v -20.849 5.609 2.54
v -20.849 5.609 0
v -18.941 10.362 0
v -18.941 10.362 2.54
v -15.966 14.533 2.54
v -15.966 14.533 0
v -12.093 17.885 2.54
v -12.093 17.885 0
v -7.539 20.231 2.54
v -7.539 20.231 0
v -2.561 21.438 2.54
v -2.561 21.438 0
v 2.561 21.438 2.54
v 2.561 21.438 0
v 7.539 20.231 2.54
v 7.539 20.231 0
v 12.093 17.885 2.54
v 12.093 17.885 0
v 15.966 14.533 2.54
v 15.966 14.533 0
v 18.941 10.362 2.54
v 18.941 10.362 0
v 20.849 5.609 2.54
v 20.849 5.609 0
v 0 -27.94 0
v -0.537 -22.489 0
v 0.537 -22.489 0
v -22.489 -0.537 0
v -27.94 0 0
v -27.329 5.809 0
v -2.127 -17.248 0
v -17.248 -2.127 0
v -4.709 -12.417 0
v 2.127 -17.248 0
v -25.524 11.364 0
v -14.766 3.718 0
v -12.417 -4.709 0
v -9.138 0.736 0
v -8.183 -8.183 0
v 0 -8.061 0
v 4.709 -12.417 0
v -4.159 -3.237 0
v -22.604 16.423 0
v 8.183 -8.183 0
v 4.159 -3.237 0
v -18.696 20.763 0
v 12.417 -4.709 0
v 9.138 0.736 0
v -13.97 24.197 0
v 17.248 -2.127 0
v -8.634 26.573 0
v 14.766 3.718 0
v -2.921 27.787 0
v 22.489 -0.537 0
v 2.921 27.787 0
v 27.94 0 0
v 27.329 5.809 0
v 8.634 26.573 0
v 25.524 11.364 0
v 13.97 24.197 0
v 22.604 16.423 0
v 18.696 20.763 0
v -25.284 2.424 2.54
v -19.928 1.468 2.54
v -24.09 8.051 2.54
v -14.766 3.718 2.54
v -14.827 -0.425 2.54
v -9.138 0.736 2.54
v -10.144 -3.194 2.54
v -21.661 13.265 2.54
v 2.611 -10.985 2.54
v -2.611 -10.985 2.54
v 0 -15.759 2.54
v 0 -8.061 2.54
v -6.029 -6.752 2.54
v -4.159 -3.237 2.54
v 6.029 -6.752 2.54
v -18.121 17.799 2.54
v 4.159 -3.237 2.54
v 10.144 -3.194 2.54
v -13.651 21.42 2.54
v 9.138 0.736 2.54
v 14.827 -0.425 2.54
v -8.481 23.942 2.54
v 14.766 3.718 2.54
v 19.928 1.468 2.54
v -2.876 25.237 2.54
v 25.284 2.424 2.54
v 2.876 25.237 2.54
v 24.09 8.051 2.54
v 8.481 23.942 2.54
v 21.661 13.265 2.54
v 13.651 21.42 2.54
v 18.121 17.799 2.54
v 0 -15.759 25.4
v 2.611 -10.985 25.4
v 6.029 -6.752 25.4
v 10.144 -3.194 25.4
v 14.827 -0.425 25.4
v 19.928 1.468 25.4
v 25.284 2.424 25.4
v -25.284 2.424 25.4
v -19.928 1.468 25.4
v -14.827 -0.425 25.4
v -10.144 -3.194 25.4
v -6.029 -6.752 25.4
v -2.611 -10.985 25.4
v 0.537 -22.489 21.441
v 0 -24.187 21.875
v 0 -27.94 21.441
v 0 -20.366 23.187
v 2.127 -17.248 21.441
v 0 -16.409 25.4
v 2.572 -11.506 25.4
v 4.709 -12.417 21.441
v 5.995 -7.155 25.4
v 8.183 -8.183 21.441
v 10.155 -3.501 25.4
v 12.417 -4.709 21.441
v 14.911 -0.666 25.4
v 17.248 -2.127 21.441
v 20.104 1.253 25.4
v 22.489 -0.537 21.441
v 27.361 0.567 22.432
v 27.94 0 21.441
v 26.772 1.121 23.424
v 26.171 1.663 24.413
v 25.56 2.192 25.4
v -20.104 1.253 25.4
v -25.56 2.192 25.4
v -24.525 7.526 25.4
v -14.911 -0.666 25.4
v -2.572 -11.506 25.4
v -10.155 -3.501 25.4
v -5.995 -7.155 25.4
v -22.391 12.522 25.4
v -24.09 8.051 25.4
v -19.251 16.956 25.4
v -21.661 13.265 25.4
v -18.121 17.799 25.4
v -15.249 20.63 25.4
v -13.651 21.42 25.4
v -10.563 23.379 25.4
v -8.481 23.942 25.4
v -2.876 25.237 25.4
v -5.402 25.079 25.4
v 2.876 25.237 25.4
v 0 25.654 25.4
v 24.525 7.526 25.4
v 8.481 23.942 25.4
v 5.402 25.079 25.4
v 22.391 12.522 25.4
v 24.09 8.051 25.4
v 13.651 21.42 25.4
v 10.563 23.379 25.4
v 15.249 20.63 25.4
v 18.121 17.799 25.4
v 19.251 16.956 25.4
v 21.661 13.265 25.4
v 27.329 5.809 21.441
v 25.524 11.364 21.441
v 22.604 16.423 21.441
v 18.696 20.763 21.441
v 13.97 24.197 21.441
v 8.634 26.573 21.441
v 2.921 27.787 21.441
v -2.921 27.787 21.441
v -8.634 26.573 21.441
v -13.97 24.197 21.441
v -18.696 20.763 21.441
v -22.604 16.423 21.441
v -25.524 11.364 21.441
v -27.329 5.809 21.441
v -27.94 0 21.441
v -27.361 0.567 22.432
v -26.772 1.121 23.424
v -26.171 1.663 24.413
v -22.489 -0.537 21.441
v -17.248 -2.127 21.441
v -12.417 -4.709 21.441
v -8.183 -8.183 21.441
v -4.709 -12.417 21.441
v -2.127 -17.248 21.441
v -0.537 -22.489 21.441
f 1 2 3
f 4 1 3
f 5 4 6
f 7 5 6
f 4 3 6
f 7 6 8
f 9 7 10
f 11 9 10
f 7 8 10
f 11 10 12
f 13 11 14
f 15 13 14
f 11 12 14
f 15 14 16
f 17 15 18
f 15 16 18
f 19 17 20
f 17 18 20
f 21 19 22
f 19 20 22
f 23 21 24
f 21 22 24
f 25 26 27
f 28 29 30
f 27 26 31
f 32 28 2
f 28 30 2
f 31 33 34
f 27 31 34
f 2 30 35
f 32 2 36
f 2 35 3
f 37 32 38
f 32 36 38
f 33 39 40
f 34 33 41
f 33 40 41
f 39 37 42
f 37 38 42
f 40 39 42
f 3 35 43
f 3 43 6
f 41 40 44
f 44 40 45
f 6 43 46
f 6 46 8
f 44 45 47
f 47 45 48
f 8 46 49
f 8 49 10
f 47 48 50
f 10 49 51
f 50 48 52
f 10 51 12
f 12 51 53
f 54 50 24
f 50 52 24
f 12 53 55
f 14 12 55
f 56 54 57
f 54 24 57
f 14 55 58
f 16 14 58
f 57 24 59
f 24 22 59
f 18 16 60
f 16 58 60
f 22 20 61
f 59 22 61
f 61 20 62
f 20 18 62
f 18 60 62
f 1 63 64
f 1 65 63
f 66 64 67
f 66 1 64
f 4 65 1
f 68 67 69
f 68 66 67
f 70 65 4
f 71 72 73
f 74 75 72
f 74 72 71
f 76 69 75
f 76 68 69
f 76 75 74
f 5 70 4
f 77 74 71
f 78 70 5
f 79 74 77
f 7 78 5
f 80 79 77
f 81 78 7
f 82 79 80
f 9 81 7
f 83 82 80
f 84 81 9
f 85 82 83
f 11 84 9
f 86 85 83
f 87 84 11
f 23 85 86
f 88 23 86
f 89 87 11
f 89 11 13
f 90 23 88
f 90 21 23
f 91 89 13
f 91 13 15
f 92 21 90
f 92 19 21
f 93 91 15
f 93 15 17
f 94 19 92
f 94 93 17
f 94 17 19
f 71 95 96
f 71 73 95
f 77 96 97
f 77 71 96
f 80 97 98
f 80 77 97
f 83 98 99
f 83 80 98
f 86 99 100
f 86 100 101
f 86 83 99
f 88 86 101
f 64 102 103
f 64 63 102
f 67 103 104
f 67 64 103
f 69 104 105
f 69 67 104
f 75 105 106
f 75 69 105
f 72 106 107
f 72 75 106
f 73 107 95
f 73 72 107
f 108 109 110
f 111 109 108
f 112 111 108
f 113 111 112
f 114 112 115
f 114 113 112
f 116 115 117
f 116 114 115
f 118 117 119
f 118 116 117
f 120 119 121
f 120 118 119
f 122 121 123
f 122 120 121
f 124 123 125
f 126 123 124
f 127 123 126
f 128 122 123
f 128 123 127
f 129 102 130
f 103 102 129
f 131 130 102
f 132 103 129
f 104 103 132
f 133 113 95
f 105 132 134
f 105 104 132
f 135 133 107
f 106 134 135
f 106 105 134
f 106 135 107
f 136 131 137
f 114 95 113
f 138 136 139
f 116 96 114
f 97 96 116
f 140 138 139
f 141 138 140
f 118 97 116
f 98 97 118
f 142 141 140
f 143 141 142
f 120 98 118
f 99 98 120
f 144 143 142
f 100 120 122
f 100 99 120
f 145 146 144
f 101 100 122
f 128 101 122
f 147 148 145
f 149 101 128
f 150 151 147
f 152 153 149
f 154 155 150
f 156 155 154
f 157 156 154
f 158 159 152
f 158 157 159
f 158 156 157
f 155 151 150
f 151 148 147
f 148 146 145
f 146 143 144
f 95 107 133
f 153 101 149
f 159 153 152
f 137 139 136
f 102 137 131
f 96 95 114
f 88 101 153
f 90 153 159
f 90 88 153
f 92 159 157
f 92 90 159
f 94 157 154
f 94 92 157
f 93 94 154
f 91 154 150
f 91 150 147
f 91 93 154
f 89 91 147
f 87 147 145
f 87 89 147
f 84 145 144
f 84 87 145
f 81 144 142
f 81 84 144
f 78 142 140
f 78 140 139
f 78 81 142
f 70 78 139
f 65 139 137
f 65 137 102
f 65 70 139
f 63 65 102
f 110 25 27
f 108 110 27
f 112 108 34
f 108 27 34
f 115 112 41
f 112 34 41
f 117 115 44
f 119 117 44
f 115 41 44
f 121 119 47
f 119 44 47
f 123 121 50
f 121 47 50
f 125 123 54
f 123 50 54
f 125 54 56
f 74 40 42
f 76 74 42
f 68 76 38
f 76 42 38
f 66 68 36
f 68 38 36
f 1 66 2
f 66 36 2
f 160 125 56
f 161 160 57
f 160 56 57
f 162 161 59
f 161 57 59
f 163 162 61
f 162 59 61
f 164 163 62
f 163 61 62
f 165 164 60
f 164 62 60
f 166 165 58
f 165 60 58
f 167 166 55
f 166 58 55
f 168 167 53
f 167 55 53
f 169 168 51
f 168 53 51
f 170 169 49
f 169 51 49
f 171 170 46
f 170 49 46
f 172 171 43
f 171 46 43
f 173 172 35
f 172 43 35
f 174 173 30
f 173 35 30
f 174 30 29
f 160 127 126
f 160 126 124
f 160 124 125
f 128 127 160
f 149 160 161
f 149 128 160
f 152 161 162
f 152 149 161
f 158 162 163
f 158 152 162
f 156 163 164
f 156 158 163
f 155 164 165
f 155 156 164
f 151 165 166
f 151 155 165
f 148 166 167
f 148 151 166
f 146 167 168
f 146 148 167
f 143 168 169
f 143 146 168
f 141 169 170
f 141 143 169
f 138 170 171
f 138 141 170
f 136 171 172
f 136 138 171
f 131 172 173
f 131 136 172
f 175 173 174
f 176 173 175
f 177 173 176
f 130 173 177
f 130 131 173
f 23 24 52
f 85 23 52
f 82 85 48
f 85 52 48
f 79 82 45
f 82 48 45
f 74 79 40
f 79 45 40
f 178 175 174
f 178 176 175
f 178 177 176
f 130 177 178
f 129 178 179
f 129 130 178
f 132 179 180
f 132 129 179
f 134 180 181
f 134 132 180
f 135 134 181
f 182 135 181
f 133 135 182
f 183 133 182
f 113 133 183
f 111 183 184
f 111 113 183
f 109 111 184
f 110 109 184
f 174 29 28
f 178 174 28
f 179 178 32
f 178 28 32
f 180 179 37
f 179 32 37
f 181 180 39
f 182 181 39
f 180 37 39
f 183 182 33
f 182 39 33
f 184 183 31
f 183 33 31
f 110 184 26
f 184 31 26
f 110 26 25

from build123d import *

# Parameters (mm, degrees)
F1_DEPTH    = 25.4
F2_T        = -2.54
F3_T2_ANGLE = 222.0796162883
F3_T4_ANGLE = 132.0289295476
F3_T6_ANGLE = 132.0289295476
F5_DEPTH    = 2.54


# Not quite as in the source:
# - a fillet or chamfer that OpenCascade refuses, or shapes differently, is made with other operations: its cross-section is extruded or revolved along the edge and cut away or added


with BuildPart() as f1:
    # F0 (on Top) → F1 (new body)
    with BuildSketch(Plane.XY):
        with BuildLine():
            ThreePointArc((-27.94, 0), (-8.1834365336, -8.1834365336), (0, -27.94))
            ThreePointArc((0, -27.94), (8.1834365336, -8.1834365336), (27.94, 0))
            ThreePointArc((27.94, 0), (0, 27.94), (-27.94, 0))
        make_face()
    extrude(amount=F1_DEPTH)

    # F2
    f2_openings = [f1.faces().sort_by_distance(p)[0] for p in [
        (0, 7.974025, 25.4),
    ]]
    offset(amount=F2_T, openings=f2_openings)

    # F3: chamfer of 2.286 x 3.9594681461 on 3 edges, made by hand

    # F3_s1 → F3_t2 (revolve, cut)
    with BuildSketch(Plane(origin=(0, 0, 0), x_dir=(0, 0, 1), z_dir=(-0.359016499, -0.9333312132, 0))):
        Polygon((21.4405318539, -27.94), (25.4, -25.654), (25.4, -27.94), align=None)
    revolve(axis=Axis((0, 0, 25.4), (0, 0, 1)), revolution_arc=F3_T2_ANGLE, mode=Mode.SUBTRACT)

    # F3_s3 → F3_t4 (revolve, cut)
    with BuildSketch(Plane(origin=(-33.70000734, -12.9459832215, 0), x_dir=(0, 0, 1), z_dir=(-0.9334899239, -0.3586036279, 0))):
        Polygon((21.4405318539, 11.8776768894), (25.4, 14.1636768894), (25.4, 11.8776768894), align=None)
    revolve(axis=Axis((-27.94, -27.94, 25.4), (0, 0, -1)), revolution_arc=F3_T4_ANGLE, mode=Mode.SUBTRACT)

    # F3_s5 → F3_t6 (revolve, cut)
    with BuildSketch(Plane(origin=(12.9459832215, -33.70000734, 0), x_dir=(0, 0, 1), z_dir=(0.3586036279, -0.9334899239, 0))):
        Polygon((21.4405318539, 11.8776768894), (25.4, 14.1636768894), (25.4, 11.8776768894), align=None)
    revolve(axis=Axis((27.94, -27.94, 25.4), (0, 0, -1)), revolution_arc=F3_T6_ANGLE, mode=Mode.SUBTRACT)

    # F4 (on face) → F5 (cut, through all)
    with BuildSketch(Plane(origin=(0, 0, 0), x_dir=(1, 0, 0), z_dir=(0, 0, -1))):
        with BuildLine():
            ThreePointArc((-20.8487433266, -5.6087433266), (0, -21.59), (20.8487433266, -5.6087433266))
            ThreePointArc((20.8487433266, -5.6087433266), (9.138001762, -0.7355812889), (0, 8.06135568))
            ThreePointArc((0, 8.06135568), (-9.138001762, -0.7355812889), (-20.8487433266, -5.6087433266))
        make_face()
    extrude(amount=-F5_DEPTH, mode=Mode.SUBTRACT)


solid = f1.part
